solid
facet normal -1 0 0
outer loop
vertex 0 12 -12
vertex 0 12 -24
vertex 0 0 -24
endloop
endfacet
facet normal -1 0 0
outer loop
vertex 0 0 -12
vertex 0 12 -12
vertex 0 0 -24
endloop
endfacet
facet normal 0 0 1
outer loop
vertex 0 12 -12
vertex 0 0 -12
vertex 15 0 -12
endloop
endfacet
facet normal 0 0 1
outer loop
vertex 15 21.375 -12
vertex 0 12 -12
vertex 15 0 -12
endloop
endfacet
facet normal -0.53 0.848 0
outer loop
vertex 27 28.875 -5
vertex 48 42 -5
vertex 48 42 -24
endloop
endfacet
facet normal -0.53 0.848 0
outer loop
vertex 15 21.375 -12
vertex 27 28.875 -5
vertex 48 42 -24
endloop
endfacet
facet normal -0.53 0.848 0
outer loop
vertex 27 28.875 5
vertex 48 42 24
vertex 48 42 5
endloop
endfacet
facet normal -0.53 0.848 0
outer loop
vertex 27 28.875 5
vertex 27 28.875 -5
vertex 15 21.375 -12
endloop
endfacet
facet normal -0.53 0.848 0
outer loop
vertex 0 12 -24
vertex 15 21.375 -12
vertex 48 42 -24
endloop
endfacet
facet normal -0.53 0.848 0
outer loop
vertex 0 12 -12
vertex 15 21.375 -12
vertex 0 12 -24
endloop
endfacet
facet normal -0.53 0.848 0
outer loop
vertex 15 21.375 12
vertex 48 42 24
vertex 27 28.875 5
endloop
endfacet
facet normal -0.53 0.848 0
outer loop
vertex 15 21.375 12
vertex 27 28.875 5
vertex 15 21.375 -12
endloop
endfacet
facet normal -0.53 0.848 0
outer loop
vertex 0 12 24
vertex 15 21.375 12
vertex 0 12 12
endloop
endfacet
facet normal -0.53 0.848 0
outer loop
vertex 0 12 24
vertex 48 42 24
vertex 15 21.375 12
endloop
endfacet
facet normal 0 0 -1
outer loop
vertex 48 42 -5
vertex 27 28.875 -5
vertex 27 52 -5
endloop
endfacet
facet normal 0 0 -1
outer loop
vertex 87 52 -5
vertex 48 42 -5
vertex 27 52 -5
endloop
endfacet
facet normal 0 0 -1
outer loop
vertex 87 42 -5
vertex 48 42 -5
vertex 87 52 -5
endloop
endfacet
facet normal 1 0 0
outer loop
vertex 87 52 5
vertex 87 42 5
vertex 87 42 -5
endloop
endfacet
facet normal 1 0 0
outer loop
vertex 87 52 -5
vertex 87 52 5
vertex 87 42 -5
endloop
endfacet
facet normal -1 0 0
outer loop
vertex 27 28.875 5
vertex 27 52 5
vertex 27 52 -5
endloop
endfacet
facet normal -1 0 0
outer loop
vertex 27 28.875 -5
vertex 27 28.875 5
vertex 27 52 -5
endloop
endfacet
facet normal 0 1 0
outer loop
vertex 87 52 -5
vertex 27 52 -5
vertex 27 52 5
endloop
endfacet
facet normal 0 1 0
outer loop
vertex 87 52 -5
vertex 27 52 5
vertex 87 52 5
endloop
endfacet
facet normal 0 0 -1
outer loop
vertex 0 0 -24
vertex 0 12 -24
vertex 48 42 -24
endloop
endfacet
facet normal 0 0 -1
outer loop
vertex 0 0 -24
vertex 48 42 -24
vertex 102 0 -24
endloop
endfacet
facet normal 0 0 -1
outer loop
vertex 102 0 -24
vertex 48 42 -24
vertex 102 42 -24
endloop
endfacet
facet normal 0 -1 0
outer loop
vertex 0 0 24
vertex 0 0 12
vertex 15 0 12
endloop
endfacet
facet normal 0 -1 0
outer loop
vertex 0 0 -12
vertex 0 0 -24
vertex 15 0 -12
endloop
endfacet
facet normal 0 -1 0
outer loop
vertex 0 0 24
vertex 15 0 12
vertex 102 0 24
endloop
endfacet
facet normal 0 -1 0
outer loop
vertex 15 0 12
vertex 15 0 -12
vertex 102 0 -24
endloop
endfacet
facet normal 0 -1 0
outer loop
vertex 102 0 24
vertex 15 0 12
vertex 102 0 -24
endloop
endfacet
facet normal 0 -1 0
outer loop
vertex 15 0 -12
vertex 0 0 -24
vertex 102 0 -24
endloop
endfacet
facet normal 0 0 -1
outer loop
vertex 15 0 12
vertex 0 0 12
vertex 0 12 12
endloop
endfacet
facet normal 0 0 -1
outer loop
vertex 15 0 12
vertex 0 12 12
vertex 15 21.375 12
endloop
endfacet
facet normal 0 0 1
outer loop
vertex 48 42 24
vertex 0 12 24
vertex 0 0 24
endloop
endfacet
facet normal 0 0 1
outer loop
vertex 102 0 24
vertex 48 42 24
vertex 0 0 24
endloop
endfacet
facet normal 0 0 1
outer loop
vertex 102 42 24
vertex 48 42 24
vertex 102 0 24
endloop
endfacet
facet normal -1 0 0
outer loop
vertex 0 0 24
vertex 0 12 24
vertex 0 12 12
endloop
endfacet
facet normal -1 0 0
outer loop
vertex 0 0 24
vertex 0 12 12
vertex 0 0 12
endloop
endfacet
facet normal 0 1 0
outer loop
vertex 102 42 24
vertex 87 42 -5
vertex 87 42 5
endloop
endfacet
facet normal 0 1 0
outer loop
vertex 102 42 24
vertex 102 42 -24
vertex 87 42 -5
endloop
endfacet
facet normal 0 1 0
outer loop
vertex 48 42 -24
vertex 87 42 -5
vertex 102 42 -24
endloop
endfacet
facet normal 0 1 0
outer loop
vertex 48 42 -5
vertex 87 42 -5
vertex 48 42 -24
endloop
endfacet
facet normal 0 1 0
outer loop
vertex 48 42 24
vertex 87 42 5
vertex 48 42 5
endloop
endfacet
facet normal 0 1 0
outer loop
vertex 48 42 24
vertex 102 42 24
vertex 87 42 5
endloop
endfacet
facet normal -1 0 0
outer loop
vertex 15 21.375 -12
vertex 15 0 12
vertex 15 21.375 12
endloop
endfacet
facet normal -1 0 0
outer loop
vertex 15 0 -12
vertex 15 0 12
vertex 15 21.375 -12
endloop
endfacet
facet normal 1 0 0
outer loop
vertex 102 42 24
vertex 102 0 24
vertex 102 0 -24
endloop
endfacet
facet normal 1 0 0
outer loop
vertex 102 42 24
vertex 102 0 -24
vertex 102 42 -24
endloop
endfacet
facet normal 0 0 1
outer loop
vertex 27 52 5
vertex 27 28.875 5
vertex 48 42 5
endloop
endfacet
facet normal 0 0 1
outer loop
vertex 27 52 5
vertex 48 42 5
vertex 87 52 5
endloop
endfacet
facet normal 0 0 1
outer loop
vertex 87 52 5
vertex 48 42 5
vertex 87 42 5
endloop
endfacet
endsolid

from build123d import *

# Parameters (mm, degrees)
BOSS_EXTRUDE1_DEPTH = 24
SKETCH2_W           = 60
SKETCH2_H           = 10
BOSS_EXTRUDE2_DEPTH = 52
CUT_EXTRUDE1_REACH  = 118.979
SKETCH3_W           = 15
SKETCH3_H           = 24


with BuildPart() as part:
    # Sketch1 → Boss-Extrude1 (new, symmetric)
    with BuildSketch(Plane.XY):
        Polygon((0, 0), (102, 0), (102, 42), (48, 42), (0, 12), align=None)
    extrude(amount=BOSS_EXTRUDE1_DEPTH, both=True)

    # Sketch2 → Boss-Extrude2 (add)
    with BuildSketch(Plane(origin=(0, 0, 0), x_dir=(1, 0, 0), z_dir=(0, 1, 0))):
        with Locations((57, 0)):
            Rectangle(SKETCH2_W, SKETCH2_H)
    extrude(amount=BOSS_EXTRUDE2_DEPTH)

    # Cut-Extrude1: up to this plane
    cut_extrude1_end = Plane(origin=(48, 42, 24), z_dir=(0.52999894000318, -0.8479983040050879, 0))
    # Sketch3 → Cut-Extrude1 (cut, up to the surface)
    with BuildSketch(Plane(origin=(0, 0, 0), x_dir=(1, 0, 0), z_dir=(0, 1, 0)), mode=Mode.PRIVATE) as cut_extrude1_sk1:
        with Locations((7.5, 0)):
            Rectangle(SKETCH3_W, SKETCH3_H)
    cut_extrude1_tool1 = split(extrude(cut_extrude1_sk1.sketch, amount=CUT_EXTRUDE1_REACH, mode=Mode.PRIVATE), bisect_by=cut_extrude1_end, keep=Keep.BOTH, mode=Mode.PRIVATE)
    add(cut_extrude1_tool1.solids().sort_by_distance((7.5, 0, 0))[0], mode=Mode.SUBTRACT)


solid = part.part
